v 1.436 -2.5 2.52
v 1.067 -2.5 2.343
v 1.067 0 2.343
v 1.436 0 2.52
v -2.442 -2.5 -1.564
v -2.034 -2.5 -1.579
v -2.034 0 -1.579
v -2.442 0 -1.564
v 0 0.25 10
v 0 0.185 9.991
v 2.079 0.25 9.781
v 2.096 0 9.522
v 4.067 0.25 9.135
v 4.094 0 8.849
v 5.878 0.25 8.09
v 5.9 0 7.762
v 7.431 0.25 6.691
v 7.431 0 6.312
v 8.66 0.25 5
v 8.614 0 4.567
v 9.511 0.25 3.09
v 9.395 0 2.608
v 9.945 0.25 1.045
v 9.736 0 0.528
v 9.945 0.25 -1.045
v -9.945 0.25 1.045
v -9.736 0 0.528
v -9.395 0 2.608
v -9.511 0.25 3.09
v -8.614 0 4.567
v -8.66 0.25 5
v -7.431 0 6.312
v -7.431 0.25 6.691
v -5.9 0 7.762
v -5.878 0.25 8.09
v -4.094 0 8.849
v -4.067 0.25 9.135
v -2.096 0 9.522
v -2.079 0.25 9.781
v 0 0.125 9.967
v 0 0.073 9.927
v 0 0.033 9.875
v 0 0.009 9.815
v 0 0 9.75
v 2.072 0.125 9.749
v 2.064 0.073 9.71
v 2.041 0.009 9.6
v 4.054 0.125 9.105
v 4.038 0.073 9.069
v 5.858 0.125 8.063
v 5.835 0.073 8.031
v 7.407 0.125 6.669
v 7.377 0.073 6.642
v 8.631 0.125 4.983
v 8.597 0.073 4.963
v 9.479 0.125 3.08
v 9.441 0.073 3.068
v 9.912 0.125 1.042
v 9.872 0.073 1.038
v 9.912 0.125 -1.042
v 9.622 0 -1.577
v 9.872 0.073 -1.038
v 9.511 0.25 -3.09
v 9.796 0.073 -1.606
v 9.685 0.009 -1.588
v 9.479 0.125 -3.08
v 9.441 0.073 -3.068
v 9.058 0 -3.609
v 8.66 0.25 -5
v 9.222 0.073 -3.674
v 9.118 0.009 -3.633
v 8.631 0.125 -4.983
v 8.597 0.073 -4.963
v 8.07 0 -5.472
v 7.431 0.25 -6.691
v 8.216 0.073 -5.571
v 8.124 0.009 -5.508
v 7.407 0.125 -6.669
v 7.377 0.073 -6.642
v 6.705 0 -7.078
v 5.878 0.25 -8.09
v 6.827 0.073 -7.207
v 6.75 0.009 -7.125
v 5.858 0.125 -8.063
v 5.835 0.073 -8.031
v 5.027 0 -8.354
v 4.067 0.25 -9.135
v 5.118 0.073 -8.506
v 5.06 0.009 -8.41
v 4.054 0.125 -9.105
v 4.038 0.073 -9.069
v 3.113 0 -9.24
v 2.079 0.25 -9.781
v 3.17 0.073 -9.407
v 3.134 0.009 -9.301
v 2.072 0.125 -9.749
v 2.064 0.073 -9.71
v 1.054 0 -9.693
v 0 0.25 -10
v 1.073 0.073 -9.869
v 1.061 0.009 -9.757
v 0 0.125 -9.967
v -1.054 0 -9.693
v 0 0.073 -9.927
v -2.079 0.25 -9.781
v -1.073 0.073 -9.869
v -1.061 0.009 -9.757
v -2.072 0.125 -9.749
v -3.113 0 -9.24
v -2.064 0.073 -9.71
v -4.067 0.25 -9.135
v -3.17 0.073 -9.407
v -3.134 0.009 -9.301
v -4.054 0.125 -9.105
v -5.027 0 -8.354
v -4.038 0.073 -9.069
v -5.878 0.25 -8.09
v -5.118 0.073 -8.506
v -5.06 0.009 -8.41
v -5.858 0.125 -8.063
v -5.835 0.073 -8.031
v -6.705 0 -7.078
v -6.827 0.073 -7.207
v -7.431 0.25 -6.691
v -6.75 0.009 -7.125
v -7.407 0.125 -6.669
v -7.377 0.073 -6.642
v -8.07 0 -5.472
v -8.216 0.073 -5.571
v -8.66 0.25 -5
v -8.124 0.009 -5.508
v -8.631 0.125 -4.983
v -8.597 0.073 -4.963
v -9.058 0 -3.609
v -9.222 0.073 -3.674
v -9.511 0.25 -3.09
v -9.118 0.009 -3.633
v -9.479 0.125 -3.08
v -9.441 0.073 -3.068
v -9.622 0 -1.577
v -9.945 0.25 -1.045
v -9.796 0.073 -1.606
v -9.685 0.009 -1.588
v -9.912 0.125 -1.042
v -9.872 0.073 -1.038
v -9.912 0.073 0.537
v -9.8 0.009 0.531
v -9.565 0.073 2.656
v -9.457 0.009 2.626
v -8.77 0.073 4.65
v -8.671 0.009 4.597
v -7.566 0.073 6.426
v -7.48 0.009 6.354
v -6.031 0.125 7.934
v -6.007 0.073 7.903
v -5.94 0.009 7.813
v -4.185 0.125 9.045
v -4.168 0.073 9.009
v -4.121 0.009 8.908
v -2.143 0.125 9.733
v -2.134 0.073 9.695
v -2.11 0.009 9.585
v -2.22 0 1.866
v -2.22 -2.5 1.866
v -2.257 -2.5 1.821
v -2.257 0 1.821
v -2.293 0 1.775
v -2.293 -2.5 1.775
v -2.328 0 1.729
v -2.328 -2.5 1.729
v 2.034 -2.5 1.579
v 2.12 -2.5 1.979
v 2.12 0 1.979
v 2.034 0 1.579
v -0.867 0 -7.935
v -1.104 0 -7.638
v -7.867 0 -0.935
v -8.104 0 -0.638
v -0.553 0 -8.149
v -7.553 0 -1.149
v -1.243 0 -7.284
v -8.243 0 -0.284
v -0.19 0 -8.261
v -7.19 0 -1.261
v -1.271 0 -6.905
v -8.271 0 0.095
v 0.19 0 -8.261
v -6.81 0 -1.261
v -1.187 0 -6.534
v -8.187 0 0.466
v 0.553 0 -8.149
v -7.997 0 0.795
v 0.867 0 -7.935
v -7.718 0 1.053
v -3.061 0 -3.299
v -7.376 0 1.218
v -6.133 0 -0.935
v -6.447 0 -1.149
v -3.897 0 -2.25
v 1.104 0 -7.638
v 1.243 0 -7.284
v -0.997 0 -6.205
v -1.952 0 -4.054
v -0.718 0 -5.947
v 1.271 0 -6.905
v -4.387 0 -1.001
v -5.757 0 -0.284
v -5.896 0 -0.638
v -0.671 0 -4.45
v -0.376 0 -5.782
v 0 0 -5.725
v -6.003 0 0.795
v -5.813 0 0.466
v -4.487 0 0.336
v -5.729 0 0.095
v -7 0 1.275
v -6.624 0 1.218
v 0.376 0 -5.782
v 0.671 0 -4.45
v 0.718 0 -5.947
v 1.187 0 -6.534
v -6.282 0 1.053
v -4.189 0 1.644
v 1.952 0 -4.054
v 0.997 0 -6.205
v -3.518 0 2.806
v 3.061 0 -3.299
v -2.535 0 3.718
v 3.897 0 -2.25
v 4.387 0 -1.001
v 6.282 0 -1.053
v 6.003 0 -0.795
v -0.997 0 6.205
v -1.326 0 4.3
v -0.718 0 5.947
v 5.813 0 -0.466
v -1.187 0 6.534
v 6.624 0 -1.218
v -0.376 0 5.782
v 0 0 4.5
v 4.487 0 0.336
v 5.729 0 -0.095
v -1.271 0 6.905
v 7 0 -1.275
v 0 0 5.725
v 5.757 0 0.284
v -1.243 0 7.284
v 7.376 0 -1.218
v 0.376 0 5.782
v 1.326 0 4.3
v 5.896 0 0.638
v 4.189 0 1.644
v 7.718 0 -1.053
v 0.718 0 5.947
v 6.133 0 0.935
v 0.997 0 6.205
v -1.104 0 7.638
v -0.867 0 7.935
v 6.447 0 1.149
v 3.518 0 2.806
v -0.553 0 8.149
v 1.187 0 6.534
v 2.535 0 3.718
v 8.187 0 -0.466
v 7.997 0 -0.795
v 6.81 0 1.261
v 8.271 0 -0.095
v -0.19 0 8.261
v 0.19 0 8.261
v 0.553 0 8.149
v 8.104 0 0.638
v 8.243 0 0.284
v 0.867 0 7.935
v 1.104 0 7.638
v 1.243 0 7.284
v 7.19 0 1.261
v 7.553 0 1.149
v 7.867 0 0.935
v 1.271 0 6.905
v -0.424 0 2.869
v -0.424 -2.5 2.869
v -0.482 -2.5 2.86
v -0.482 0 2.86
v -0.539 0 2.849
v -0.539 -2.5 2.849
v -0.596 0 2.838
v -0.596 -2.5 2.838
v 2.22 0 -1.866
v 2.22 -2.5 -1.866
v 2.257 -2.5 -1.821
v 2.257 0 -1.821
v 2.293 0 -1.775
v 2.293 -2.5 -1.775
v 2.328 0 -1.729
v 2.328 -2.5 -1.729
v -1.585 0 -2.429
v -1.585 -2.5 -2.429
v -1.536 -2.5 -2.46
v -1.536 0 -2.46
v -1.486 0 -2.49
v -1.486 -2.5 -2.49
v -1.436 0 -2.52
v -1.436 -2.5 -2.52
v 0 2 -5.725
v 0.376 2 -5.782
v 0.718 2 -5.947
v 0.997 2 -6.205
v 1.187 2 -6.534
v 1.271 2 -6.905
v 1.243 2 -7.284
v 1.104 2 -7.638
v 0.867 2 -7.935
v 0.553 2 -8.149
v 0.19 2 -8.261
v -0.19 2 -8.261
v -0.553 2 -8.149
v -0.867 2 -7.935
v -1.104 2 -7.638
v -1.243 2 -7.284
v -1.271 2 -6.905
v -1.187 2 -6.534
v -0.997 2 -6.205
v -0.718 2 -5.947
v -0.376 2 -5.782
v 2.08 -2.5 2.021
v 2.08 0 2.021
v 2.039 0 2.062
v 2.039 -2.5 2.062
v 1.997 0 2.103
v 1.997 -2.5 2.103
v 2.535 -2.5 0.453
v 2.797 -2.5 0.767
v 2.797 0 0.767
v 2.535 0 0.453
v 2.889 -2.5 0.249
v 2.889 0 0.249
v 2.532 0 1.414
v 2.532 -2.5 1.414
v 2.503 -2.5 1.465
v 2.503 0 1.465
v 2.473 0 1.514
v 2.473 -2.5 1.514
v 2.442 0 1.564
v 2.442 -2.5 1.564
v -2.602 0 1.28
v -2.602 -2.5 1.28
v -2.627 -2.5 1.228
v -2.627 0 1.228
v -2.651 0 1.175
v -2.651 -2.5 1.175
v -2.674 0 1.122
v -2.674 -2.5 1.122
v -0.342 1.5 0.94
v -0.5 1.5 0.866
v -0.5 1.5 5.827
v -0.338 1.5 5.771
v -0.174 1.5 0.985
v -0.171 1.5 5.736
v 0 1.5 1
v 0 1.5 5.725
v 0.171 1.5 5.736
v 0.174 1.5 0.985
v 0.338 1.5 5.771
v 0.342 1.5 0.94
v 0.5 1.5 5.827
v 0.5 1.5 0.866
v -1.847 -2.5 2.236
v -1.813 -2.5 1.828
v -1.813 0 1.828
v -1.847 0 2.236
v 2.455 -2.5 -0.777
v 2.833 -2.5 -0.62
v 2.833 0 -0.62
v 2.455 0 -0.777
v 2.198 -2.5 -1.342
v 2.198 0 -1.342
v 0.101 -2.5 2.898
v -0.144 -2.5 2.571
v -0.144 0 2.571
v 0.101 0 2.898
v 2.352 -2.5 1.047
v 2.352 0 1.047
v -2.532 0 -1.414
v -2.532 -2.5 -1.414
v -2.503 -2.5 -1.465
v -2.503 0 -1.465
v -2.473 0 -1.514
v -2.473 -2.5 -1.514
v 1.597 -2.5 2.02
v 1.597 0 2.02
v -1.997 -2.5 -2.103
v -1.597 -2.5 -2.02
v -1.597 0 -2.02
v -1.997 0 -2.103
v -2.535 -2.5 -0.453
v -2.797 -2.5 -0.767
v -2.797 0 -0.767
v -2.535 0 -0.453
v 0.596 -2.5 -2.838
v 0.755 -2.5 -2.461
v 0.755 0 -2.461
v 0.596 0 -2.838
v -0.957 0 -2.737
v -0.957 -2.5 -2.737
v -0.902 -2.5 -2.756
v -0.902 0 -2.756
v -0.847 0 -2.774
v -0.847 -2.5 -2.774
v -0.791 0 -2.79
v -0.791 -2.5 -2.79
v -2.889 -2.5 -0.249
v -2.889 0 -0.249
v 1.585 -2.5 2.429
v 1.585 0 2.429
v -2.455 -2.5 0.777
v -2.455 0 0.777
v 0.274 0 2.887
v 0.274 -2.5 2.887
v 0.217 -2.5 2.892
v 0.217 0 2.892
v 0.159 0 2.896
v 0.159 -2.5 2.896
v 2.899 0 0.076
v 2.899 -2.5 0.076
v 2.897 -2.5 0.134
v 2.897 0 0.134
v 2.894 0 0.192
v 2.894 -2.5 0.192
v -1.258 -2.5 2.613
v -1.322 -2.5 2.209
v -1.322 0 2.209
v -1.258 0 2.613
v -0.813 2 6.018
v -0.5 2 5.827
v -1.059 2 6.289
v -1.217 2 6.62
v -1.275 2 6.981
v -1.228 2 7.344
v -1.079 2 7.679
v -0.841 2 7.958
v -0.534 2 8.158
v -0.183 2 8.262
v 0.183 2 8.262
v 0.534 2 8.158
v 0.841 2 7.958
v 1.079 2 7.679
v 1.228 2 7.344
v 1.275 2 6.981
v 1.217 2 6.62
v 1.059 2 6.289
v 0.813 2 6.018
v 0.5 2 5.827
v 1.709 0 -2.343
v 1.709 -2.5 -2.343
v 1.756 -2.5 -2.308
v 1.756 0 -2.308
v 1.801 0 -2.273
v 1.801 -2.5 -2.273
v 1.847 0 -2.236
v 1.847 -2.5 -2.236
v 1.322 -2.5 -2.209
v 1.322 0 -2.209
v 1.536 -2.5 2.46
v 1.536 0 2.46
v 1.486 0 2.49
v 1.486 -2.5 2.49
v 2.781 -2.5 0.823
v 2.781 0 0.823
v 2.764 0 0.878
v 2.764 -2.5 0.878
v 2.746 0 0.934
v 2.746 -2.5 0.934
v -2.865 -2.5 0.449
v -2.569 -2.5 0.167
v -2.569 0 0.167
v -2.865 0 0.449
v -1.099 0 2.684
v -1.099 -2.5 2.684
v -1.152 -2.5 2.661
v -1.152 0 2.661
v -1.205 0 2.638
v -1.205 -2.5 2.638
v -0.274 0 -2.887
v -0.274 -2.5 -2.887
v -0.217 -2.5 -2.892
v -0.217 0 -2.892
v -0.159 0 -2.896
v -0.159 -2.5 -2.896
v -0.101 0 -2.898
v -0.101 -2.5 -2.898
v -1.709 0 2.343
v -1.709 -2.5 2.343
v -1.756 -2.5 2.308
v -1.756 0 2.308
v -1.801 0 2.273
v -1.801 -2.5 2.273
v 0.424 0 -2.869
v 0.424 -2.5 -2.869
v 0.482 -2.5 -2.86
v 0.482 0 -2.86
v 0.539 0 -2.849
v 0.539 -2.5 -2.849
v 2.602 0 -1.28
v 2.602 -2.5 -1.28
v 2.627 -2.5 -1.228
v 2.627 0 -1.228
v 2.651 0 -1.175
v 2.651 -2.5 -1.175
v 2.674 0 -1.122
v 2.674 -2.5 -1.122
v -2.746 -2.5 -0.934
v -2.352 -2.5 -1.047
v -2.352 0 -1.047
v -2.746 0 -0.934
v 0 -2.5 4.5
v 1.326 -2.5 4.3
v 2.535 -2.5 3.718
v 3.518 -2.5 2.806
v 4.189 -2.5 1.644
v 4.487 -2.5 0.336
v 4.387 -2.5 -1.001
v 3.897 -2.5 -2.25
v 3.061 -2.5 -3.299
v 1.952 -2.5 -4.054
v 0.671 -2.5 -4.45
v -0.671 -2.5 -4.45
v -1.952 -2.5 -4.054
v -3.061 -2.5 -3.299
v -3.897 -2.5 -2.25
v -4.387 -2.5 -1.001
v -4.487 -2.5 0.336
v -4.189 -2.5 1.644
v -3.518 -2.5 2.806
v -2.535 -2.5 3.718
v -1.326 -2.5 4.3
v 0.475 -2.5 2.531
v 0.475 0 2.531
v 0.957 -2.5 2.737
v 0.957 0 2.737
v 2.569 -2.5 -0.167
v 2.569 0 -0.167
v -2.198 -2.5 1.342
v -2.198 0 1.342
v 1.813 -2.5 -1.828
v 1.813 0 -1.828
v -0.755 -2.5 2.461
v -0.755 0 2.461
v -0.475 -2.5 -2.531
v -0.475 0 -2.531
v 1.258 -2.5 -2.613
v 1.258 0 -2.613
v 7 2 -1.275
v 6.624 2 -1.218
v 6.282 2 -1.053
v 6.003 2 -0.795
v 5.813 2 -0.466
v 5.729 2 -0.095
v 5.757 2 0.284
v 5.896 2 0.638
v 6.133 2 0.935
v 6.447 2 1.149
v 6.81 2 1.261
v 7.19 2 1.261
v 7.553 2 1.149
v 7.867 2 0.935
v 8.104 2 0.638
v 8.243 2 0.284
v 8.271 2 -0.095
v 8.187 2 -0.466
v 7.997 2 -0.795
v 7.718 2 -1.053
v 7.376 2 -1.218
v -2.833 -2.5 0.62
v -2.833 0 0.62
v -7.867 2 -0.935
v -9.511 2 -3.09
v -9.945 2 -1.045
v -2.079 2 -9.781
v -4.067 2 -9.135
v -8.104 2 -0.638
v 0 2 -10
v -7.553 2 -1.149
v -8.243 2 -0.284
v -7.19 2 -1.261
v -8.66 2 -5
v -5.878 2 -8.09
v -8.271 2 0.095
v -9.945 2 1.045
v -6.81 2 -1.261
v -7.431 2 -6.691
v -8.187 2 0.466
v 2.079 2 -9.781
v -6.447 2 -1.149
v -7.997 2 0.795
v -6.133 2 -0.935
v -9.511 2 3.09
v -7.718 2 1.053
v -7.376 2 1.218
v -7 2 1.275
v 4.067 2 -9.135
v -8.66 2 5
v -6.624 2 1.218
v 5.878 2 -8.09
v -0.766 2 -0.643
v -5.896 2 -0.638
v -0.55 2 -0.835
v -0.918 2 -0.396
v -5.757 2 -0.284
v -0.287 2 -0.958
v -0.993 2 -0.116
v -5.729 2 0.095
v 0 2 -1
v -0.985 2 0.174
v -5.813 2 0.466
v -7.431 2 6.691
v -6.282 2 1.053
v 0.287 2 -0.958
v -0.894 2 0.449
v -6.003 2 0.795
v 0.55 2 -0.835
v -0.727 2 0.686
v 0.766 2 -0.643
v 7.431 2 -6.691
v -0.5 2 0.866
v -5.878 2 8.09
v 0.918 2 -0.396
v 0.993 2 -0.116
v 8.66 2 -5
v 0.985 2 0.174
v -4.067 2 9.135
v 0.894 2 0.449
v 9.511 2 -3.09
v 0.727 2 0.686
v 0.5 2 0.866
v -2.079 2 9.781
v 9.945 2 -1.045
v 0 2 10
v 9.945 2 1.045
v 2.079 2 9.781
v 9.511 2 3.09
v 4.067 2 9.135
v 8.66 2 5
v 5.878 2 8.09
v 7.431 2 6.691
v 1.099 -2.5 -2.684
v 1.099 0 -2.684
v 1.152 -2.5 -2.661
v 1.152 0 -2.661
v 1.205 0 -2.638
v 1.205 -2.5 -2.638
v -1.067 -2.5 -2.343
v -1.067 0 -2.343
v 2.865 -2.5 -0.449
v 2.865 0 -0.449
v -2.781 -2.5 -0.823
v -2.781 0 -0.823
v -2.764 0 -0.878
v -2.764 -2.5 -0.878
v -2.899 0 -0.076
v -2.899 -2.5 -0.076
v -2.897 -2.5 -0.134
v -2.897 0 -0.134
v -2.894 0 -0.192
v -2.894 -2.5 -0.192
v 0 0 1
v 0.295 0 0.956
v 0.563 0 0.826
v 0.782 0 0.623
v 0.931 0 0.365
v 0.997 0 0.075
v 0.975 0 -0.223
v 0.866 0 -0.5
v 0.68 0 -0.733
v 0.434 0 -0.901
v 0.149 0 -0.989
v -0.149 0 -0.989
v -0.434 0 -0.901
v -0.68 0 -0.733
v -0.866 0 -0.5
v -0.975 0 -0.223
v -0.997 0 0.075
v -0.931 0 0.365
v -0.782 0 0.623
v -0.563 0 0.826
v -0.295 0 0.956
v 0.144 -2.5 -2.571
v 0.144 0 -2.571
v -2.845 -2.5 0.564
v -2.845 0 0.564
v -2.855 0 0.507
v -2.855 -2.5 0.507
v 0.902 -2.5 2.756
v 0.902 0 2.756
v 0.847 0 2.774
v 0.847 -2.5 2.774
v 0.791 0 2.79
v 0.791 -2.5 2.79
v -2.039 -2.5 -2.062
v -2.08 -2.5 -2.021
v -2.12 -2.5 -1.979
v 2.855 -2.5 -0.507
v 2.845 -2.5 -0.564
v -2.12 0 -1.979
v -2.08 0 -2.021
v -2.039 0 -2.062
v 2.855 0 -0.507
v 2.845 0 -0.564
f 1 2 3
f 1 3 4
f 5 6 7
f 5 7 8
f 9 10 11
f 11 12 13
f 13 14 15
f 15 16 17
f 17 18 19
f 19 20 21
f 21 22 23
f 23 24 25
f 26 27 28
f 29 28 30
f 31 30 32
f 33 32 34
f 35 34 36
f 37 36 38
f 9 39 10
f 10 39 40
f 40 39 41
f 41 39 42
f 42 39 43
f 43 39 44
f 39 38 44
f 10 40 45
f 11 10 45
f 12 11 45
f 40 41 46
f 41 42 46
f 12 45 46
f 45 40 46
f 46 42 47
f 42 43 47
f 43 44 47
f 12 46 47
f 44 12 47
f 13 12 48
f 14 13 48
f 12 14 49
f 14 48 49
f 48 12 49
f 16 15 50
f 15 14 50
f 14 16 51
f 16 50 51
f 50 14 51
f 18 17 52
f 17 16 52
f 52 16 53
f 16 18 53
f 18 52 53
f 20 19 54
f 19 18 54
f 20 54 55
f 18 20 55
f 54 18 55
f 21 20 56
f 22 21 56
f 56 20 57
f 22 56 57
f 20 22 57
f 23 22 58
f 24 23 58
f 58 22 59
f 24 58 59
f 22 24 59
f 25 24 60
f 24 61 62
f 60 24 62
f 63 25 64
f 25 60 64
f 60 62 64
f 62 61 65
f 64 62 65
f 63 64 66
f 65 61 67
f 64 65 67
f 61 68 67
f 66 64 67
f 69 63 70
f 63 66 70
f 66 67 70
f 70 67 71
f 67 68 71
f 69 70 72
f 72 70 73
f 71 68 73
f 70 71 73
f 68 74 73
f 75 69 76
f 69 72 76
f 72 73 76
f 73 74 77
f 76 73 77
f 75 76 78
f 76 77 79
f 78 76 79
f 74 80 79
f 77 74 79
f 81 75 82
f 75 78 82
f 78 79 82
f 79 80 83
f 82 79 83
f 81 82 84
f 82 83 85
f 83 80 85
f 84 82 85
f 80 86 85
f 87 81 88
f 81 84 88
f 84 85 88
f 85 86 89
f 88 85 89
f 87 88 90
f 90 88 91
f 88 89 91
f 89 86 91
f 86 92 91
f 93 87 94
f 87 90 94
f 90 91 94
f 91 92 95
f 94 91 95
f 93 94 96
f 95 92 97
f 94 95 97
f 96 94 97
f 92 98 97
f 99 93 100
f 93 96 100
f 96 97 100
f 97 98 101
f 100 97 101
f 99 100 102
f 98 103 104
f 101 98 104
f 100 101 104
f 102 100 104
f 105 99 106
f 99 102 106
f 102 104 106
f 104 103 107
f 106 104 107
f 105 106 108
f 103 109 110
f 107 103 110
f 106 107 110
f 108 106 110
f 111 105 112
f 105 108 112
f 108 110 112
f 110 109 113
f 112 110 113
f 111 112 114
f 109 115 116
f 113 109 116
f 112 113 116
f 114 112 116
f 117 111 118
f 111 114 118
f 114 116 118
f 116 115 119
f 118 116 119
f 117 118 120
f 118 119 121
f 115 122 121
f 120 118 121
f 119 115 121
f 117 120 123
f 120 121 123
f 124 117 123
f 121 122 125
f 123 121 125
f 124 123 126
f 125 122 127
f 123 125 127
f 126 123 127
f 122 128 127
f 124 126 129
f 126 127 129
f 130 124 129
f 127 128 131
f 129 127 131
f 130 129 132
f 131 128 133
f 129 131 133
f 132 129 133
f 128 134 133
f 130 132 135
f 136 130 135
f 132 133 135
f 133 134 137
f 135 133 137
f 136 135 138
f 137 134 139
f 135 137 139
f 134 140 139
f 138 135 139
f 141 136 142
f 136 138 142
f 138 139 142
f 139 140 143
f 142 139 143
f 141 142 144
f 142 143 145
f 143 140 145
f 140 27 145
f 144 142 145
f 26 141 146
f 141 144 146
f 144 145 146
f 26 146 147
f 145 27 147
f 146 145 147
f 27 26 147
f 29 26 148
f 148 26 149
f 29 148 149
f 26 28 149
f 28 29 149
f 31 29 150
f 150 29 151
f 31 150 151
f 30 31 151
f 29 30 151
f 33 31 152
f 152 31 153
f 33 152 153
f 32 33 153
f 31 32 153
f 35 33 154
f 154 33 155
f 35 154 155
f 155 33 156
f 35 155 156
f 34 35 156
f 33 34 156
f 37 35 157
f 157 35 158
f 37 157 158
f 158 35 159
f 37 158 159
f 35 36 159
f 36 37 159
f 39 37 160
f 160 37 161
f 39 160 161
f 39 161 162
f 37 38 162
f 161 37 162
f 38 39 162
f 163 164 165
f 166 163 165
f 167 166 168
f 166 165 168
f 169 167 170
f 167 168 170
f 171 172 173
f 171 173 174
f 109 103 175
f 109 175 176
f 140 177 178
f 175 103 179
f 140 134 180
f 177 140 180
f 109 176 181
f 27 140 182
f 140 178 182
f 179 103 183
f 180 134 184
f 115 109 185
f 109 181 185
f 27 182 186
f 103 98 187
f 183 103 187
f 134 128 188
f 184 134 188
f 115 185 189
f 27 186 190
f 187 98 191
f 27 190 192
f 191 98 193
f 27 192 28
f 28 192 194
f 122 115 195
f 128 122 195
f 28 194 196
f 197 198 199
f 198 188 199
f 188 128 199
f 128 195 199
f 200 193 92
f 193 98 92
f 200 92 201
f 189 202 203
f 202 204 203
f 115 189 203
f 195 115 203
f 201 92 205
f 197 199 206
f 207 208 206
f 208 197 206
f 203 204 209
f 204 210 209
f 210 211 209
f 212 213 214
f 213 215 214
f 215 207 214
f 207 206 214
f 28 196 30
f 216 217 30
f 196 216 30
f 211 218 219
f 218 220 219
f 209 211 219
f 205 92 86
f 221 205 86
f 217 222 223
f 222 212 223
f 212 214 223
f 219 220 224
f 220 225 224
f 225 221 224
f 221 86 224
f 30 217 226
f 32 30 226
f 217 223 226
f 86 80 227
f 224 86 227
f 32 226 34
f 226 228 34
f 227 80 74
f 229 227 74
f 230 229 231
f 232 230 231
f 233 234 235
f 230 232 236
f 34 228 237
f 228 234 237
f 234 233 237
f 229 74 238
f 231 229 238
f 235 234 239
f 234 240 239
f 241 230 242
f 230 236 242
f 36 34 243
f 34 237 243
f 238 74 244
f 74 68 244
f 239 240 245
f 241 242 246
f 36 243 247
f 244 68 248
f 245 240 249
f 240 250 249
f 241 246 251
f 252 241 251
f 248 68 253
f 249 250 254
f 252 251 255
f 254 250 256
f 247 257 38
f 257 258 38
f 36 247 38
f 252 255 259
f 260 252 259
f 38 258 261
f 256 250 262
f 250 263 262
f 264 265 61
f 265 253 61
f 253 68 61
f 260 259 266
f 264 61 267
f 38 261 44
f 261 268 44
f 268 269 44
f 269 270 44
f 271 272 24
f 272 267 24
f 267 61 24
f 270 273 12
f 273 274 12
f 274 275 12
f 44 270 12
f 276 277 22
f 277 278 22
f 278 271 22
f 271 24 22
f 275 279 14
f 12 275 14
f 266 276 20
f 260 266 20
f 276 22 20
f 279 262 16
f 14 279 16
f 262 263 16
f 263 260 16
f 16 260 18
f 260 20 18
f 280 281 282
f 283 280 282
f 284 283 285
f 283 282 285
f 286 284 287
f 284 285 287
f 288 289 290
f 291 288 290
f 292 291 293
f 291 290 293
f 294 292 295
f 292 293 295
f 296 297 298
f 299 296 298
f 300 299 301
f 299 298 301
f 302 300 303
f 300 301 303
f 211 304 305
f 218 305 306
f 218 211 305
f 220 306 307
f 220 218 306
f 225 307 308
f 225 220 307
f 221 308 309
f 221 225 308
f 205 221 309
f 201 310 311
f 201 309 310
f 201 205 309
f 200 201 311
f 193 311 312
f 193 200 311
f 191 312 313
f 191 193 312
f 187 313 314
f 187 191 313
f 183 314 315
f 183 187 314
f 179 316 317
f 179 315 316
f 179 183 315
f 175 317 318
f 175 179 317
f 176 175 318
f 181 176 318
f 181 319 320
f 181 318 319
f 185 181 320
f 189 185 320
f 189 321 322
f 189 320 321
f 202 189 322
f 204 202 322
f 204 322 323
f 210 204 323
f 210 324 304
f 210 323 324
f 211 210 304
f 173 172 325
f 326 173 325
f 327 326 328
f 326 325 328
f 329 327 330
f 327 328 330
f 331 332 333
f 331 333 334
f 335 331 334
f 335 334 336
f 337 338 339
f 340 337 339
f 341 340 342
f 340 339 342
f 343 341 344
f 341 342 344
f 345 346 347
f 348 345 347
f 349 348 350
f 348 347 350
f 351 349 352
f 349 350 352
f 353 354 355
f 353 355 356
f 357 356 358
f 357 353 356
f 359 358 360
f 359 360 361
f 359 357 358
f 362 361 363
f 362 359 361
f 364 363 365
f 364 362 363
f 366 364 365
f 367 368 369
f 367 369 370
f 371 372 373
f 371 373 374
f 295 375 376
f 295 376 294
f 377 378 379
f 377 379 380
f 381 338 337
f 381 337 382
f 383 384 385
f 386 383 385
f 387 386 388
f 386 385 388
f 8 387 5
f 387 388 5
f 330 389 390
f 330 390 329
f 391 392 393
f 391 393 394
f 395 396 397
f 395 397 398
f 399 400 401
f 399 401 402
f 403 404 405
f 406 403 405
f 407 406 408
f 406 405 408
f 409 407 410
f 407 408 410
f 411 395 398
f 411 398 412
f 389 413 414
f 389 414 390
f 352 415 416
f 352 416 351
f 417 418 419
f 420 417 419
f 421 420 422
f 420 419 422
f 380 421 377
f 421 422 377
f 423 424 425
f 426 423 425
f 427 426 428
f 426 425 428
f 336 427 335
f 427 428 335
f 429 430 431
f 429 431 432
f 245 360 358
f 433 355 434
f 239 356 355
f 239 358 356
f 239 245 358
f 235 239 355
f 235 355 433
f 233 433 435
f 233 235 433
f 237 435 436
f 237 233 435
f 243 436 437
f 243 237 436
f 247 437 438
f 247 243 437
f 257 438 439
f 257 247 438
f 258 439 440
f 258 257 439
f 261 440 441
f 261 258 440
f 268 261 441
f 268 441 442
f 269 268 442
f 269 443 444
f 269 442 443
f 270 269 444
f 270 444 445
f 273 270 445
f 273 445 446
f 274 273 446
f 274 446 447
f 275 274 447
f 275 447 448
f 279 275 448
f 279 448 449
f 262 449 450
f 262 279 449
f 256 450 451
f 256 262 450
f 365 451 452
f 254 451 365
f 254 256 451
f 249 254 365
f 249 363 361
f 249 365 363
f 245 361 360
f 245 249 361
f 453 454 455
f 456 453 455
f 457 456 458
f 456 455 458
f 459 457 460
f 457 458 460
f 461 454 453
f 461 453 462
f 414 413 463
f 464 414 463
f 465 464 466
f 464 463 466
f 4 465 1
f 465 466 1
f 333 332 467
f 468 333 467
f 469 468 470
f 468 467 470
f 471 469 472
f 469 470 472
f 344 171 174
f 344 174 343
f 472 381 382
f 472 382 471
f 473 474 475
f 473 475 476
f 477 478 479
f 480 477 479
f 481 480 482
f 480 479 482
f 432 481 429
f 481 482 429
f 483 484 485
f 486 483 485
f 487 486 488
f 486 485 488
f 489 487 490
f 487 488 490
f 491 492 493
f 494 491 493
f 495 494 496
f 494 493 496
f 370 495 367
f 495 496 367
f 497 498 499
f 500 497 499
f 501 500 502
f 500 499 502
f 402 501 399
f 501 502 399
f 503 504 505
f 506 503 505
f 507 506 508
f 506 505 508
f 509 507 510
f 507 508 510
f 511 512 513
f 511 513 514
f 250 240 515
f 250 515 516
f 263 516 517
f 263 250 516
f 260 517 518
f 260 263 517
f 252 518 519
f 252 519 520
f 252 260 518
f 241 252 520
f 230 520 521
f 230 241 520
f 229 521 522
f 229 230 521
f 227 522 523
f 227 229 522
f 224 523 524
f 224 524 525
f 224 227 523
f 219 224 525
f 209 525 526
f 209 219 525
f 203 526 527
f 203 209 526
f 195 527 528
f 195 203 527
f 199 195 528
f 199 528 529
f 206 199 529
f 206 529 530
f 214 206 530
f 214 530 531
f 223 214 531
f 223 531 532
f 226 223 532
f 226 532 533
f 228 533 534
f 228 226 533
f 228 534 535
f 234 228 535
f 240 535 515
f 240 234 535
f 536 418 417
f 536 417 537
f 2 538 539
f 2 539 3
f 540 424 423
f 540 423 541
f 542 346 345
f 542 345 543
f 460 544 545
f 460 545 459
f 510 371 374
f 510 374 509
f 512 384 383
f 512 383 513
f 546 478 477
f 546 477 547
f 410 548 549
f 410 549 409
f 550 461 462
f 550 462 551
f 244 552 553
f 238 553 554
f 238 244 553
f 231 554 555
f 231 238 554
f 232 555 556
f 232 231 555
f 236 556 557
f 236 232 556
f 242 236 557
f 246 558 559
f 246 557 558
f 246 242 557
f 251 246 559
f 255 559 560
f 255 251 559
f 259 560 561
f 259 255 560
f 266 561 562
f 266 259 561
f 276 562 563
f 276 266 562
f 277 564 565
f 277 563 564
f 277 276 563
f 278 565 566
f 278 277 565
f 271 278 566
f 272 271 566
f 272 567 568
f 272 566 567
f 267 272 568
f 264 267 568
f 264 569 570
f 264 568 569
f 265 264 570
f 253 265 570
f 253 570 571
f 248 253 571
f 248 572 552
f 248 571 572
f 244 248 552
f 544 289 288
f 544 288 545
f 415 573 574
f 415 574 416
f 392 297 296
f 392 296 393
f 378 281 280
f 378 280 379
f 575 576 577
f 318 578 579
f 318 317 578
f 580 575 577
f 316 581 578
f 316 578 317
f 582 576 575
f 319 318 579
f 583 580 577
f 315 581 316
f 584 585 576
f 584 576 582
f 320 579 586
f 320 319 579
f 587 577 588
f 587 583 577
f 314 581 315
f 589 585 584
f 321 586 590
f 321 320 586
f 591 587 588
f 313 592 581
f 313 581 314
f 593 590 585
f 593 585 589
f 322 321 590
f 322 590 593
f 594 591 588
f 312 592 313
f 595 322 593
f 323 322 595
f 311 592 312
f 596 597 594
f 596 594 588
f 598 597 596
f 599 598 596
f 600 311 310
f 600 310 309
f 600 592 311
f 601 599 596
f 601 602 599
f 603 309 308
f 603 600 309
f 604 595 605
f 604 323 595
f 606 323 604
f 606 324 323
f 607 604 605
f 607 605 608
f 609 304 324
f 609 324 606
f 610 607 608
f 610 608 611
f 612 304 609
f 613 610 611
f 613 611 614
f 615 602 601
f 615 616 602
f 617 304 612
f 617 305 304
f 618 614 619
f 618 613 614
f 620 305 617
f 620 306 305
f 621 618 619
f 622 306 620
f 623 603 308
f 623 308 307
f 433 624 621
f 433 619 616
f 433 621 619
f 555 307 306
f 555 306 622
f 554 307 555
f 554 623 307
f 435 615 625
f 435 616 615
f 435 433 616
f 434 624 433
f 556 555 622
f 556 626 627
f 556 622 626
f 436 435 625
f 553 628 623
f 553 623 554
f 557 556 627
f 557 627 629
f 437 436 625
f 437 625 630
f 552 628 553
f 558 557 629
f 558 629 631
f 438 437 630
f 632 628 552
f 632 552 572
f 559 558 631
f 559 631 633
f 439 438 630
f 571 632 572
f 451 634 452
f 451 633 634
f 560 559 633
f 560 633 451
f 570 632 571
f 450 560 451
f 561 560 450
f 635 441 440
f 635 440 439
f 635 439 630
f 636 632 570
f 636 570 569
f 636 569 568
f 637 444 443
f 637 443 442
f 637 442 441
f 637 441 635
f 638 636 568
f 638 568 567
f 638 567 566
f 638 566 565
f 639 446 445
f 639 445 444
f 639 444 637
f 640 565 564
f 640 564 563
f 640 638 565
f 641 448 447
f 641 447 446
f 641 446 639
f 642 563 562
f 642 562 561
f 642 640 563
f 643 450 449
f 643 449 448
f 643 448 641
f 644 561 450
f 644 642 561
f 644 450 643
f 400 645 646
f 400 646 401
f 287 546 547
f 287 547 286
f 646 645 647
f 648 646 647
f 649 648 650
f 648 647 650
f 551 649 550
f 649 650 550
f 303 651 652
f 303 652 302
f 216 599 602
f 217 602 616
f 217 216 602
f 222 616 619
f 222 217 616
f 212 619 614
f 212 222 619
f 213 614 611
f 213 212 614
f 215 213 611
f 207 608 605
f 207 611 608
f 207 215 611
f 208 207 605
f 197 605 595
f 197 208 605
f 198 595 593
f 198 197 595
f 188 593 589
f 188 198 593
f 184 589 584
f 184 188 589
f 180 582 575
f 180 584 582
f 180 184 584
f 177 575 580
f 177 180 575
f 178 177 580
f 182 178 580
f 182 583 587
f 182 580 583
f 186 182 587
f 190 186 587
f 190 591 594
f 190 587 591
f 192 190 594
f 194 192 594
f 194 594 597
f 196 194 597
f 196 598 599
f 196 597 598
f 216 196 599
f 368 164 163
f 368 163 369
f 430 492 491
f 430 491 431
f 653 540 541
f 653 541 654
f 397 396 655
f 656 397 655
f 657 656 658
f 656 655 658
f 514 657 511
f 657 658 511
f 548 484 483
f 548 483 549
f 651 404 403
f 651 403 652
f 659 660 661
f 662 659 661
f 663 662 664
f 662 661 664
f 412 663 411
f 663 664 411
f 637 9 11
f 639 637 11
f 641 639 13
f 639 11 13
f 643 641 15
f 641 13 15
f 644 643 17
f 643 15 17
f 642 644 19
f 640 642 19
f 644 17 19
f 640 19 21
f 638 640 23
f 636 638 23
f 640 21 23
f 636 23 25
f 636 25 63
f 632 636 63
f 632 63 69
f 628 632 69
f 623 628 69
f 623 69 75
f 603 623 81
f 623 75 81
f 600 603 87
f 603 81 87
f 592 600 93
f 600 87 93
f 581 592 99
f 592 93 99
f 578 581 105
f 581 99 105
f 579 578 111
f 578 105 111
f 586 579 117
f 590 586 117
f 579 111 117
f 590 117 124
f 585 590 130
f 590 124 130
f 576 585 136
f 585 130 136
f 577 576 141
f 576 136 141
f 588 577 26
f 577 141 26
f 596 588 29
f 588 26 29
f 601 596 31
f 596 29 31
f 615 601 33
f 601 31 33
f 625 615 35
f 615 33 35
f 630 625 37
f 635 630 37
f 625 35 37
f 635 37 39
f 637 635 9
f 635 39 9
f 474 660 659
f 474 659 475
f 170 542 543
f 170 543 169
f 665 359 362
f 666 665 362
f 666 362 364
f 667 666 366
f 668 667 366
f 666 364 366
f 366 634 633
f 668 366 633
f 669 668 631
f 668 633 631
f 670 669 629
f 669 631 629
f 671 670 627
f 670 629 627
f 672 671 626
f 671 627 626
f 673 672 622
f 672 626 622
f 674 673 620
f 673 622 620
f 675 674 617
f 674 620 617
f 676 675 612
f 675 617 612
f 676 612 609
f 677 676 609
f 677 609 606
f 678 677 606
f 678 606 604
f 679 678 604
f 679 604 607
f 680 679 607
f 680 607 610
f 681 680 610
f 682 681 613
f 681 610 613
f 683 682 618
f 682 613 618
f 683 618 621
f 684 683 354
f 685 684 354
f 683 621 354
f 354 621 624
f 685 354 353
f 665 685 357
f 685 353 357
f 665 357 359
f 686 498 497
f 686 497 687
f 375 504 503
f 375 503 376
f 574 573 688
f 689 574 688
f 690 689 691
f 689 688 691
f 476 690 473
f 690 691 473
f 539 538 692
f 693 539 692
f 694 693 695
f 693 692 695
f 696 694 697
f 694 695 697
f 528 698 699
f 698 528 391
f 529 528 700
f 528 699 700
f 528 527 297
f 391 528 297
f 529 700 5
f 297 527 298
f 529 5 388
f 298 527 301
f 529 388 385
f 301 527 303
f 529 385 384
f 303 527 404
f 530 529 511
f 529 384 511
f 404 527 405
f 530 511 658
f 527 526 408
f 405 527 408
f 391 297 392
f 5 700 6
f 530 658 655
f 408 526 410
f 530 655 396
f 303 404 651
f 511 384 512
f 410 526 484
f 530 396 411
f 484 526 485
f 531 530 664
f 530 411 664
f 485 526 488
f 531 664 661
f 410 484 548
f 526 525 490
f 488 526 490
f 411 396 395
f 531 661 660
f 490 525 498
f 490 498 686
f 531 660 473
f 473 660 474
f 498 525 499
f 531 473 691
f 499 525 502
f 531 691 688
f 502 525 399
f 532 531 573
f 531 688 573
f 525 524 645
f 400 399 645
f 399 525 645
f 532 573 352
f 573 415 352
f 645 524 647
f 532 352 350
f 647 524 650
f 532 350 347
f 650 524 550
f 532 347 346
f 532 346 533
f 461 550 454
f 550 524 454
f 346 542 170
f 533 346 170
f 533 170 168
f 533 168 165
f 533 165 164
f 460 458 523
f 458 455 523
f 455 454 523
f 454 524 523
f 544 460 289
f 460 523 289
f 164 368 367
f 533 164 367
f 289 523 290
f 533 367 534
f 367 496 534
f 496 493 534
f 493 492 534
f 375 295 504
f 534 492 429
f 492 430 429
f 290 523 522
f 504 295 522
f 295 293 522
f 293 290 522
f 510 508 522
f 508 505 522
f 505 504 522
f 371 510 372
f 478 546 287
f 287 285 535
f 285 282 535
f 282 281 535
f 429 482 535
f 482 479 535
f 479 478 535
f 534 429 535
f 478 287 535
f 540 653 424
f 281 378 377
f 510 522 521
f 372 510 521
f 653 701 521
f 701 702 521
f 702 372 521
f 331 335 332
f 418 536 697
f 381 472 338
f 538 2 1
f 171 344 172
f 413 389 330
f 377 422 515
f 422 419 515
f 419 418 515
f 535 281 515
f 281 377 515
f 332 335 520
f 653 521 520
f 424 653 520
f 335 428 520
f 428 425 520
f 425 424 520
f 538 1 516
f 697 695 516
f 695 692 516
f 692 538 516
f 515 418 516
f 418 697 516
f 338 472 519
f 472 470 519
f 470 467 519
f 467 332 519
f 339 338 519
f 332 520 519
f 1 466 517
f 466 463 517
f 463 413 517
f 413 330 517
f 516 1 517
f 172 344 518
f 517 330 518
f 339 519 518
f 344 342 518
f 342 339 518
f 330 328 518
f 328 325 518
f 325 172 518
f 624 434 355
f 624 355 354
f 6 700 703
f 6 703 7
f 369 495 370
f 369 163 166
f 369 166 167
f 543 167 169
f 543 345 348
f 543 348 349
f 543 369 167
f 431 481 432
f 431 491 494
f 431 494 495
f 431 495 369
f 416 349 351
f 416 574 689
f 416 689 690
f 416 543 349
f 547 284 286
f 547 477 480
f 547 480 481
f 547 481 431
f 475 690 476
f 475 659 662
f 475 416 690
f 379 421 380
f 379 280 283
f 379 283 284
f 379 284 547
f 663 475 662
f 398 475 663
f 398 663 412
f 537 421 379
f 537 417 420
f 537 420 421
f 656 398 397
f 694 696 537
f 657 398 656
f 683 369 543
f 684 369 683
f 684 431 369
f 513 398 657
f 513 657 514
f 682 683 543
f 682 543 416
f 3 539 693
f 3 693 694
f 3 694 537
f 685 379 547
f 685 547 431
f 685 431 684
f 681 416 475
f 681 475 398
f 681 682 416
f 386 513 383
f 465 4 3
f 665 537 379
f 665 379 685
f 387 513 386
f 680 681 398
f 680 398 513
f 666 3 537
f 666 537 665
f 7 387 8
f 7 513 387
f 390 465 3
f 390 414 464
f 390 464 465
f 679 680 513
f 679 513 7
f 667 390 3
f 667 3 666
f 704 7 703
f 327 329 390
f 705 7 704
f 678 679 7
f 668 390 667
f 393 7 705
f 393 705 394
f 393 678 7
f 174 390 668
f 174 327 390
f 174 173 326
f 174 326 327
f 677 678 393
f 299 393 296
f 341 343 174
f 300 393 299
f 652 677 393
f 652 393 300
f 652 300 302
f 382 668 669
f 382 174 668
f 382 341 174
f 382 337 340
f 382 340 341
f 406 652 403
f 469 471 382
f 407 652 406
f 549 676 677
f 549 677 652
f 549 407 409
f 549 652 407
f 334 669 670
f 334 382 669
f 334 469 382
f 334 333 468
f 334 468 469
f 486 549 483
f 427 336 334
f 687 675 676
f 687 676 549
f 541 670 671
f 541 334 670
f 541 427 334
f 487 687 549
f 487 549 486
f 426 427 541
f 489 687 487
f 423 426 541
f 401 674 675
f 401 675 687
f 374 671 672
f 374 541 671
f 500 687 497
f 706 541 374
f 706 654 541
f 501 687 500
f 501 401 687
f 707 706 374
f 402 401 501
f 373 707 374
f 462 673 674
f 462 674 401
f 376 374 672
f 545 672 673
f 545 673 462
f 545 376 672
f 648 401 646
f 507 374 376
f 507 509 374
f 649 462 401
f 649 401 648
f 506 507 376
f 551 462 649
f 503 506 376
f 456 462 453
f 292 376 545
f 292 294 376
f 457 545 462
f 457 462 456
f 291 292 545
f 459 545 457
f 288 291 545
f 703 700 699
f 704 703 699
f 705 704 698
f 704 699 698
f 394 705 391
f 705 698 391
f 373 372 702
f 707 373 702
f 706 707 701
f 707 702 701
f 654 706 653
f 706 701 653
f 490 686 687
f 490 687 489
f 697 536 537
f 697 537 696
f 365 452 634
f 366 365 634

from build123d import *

# Parameters (mm, degrees)
SKETCH1_R           = 10
BOSS_EXTRUDE1_DEPTH = 2
SKETCH2_R           = 4.5
BOSS_EXTRUDE2_DEPTH = 2.5
SKETCH3_R           = 1.275
CUT_EXTRUDE1_DEPTH  = 15.361406616
FILLET1_R           = 0.25
SKETCH6_R           = 1
CUT_EXTRUDE2_DEPTH  = 15.840822214
SKETCH7_R           = 2.9
CUT_EXTRUDE3_DEPTH  = 2.5
BOSS_EXTRUDE4_DEPTH = 2.5
CIRPATTERN1_COUNT   = 26
SKETCH9_W           = 1
SKETCH9_H           = 7
CUT_EXTRUDE4_DEPTH  = 0.5


with BuildPart() as part:
    # Sketch1 → Boss-Extrude1 (new body)
    with BuildSketch(Plane(origin=(0, 0, 0), x_dir=(1, 0, 0), z_dir=(0, 1, 0))):
        with Locations(Location((0, 0, 0), (0, 0, 270))):
            Circle(SKETCH1_R)
    extrude(amount=BOSS_EXTRUDE1_DEPTH)

    # Sketch2 → Boss-Extrude2 (add)
    with BuildSketch(Plane(origin=(0, 0, 0), x_dir=(1, 0, 0), z_dir=(0, 1, 0))):
        with Locations(Location((0, 0, 0), (0, 0, 270))):
            Circle(SKETCH2_R)
    extrude(amount=-BOSS_EXTRUDE2_DEPTH)

    # Sketch3 → Cut-Extrude1 (cut, through all)
    with BuildSketch(Plane(origin=(0, 0, 0), x_dir=(1, 0, 0), z_dir=(0, 1, 0))):
        with Locations(Location((0, 7, 0), (0, 0, 270))):
            Circle(SKETCH3_R)
        with Locations(Location((-7, 0, 0), (0, 0, 270))):
            Circle(SKETCH3_R)
        with Locations(Location((0, -7, 0), (0, 0, 90))):
            Circle(SKETCH3_R)
        with Locations(Location((7, 0, 0), (0, 0, 90))):
            Circle(SKETCH3_R)
    extrude(amount=CUT_EXTRUDE1_DEPTH, mode=Mode.SUBTRACT)

    # Fillet1
    fillet1_edges = [part.edges().sort_by_distance(p)[0] for p in [
        (0, 0, -10),
    ]]
    fillet(fillet1_edges, radius=FILLET1_R)

    # Sketch6 → Cut-Extrude2 (cut, through all)
    with BuildSketch(Plane(origin=(0, 2, 0), x_dir=(1, 0, 0), z_dir=(0, 1, 0))):
        with Locations(Location((0, 0, 0), (0, 0, 270))):
            Circle(SKETCH6_R)
    extrude(amount=-CUT_EXTRUDE2_DEPTH, mode=Mode.SUBTRACT)

    # Sketch7 → Cut-Extrude3 (cut)
    with BuildSketch(Plane.XZ.offset(2.5)):
        with Locations(Location((0, 0, 0), (0, 0, 270))):
            Circle(SKETCH7_R)
    extrude(amount=-CUT_EXTRUDE3_DEPTH, mode=Mode.SUBTRACT)

    # Sketch8 → Boss-Extrude4 (add)
    with BuildSketch(Plane.XZ.offset(2.5)):
        with BuildLine():
            Line((-2.35244742, -1.046531787), (-2.745588284, -0.933672842))
            ThreePointArc((-2.745588284, -0.933672842), (-2.649635472, -1.178741646), (-2.531859978, -1.414102207))
            Line((-2.531859978, -1.414102207), (-2.35244742, -1.046531787))
        make_face()
    boss_extrude4 = extrude(amount=-BOSS_EXTRUDE4_DEPTH)

    # CirPattern1: Boss-Extrude4 ×26 about axis
    cirpattern1_axis = Axis((0, 0, 0), (0, 1, 0))
    for i in range(1, CIRPATTERN1_COUNT):
        add(boss_extrude4.rotate(cirpattern1_axis, i * 360 / CIRPATTERN1_COUNT))

    # Sketch9 → Cut-Extrude4 (cut)
    with BuildSketch(Plane(origin=(0, 2, 0), x_dir=(1, 0, 0), z_dir=(0, 1, 0))):
        with Locations((0, -3.5)):
            Rectangle(SKETCH9_W, SKETCH9_H)
    extrude(amount=-CUT_EXTRUDE4_DEPTH, mode=Mode.SUBTRACT)


solid = part.part
